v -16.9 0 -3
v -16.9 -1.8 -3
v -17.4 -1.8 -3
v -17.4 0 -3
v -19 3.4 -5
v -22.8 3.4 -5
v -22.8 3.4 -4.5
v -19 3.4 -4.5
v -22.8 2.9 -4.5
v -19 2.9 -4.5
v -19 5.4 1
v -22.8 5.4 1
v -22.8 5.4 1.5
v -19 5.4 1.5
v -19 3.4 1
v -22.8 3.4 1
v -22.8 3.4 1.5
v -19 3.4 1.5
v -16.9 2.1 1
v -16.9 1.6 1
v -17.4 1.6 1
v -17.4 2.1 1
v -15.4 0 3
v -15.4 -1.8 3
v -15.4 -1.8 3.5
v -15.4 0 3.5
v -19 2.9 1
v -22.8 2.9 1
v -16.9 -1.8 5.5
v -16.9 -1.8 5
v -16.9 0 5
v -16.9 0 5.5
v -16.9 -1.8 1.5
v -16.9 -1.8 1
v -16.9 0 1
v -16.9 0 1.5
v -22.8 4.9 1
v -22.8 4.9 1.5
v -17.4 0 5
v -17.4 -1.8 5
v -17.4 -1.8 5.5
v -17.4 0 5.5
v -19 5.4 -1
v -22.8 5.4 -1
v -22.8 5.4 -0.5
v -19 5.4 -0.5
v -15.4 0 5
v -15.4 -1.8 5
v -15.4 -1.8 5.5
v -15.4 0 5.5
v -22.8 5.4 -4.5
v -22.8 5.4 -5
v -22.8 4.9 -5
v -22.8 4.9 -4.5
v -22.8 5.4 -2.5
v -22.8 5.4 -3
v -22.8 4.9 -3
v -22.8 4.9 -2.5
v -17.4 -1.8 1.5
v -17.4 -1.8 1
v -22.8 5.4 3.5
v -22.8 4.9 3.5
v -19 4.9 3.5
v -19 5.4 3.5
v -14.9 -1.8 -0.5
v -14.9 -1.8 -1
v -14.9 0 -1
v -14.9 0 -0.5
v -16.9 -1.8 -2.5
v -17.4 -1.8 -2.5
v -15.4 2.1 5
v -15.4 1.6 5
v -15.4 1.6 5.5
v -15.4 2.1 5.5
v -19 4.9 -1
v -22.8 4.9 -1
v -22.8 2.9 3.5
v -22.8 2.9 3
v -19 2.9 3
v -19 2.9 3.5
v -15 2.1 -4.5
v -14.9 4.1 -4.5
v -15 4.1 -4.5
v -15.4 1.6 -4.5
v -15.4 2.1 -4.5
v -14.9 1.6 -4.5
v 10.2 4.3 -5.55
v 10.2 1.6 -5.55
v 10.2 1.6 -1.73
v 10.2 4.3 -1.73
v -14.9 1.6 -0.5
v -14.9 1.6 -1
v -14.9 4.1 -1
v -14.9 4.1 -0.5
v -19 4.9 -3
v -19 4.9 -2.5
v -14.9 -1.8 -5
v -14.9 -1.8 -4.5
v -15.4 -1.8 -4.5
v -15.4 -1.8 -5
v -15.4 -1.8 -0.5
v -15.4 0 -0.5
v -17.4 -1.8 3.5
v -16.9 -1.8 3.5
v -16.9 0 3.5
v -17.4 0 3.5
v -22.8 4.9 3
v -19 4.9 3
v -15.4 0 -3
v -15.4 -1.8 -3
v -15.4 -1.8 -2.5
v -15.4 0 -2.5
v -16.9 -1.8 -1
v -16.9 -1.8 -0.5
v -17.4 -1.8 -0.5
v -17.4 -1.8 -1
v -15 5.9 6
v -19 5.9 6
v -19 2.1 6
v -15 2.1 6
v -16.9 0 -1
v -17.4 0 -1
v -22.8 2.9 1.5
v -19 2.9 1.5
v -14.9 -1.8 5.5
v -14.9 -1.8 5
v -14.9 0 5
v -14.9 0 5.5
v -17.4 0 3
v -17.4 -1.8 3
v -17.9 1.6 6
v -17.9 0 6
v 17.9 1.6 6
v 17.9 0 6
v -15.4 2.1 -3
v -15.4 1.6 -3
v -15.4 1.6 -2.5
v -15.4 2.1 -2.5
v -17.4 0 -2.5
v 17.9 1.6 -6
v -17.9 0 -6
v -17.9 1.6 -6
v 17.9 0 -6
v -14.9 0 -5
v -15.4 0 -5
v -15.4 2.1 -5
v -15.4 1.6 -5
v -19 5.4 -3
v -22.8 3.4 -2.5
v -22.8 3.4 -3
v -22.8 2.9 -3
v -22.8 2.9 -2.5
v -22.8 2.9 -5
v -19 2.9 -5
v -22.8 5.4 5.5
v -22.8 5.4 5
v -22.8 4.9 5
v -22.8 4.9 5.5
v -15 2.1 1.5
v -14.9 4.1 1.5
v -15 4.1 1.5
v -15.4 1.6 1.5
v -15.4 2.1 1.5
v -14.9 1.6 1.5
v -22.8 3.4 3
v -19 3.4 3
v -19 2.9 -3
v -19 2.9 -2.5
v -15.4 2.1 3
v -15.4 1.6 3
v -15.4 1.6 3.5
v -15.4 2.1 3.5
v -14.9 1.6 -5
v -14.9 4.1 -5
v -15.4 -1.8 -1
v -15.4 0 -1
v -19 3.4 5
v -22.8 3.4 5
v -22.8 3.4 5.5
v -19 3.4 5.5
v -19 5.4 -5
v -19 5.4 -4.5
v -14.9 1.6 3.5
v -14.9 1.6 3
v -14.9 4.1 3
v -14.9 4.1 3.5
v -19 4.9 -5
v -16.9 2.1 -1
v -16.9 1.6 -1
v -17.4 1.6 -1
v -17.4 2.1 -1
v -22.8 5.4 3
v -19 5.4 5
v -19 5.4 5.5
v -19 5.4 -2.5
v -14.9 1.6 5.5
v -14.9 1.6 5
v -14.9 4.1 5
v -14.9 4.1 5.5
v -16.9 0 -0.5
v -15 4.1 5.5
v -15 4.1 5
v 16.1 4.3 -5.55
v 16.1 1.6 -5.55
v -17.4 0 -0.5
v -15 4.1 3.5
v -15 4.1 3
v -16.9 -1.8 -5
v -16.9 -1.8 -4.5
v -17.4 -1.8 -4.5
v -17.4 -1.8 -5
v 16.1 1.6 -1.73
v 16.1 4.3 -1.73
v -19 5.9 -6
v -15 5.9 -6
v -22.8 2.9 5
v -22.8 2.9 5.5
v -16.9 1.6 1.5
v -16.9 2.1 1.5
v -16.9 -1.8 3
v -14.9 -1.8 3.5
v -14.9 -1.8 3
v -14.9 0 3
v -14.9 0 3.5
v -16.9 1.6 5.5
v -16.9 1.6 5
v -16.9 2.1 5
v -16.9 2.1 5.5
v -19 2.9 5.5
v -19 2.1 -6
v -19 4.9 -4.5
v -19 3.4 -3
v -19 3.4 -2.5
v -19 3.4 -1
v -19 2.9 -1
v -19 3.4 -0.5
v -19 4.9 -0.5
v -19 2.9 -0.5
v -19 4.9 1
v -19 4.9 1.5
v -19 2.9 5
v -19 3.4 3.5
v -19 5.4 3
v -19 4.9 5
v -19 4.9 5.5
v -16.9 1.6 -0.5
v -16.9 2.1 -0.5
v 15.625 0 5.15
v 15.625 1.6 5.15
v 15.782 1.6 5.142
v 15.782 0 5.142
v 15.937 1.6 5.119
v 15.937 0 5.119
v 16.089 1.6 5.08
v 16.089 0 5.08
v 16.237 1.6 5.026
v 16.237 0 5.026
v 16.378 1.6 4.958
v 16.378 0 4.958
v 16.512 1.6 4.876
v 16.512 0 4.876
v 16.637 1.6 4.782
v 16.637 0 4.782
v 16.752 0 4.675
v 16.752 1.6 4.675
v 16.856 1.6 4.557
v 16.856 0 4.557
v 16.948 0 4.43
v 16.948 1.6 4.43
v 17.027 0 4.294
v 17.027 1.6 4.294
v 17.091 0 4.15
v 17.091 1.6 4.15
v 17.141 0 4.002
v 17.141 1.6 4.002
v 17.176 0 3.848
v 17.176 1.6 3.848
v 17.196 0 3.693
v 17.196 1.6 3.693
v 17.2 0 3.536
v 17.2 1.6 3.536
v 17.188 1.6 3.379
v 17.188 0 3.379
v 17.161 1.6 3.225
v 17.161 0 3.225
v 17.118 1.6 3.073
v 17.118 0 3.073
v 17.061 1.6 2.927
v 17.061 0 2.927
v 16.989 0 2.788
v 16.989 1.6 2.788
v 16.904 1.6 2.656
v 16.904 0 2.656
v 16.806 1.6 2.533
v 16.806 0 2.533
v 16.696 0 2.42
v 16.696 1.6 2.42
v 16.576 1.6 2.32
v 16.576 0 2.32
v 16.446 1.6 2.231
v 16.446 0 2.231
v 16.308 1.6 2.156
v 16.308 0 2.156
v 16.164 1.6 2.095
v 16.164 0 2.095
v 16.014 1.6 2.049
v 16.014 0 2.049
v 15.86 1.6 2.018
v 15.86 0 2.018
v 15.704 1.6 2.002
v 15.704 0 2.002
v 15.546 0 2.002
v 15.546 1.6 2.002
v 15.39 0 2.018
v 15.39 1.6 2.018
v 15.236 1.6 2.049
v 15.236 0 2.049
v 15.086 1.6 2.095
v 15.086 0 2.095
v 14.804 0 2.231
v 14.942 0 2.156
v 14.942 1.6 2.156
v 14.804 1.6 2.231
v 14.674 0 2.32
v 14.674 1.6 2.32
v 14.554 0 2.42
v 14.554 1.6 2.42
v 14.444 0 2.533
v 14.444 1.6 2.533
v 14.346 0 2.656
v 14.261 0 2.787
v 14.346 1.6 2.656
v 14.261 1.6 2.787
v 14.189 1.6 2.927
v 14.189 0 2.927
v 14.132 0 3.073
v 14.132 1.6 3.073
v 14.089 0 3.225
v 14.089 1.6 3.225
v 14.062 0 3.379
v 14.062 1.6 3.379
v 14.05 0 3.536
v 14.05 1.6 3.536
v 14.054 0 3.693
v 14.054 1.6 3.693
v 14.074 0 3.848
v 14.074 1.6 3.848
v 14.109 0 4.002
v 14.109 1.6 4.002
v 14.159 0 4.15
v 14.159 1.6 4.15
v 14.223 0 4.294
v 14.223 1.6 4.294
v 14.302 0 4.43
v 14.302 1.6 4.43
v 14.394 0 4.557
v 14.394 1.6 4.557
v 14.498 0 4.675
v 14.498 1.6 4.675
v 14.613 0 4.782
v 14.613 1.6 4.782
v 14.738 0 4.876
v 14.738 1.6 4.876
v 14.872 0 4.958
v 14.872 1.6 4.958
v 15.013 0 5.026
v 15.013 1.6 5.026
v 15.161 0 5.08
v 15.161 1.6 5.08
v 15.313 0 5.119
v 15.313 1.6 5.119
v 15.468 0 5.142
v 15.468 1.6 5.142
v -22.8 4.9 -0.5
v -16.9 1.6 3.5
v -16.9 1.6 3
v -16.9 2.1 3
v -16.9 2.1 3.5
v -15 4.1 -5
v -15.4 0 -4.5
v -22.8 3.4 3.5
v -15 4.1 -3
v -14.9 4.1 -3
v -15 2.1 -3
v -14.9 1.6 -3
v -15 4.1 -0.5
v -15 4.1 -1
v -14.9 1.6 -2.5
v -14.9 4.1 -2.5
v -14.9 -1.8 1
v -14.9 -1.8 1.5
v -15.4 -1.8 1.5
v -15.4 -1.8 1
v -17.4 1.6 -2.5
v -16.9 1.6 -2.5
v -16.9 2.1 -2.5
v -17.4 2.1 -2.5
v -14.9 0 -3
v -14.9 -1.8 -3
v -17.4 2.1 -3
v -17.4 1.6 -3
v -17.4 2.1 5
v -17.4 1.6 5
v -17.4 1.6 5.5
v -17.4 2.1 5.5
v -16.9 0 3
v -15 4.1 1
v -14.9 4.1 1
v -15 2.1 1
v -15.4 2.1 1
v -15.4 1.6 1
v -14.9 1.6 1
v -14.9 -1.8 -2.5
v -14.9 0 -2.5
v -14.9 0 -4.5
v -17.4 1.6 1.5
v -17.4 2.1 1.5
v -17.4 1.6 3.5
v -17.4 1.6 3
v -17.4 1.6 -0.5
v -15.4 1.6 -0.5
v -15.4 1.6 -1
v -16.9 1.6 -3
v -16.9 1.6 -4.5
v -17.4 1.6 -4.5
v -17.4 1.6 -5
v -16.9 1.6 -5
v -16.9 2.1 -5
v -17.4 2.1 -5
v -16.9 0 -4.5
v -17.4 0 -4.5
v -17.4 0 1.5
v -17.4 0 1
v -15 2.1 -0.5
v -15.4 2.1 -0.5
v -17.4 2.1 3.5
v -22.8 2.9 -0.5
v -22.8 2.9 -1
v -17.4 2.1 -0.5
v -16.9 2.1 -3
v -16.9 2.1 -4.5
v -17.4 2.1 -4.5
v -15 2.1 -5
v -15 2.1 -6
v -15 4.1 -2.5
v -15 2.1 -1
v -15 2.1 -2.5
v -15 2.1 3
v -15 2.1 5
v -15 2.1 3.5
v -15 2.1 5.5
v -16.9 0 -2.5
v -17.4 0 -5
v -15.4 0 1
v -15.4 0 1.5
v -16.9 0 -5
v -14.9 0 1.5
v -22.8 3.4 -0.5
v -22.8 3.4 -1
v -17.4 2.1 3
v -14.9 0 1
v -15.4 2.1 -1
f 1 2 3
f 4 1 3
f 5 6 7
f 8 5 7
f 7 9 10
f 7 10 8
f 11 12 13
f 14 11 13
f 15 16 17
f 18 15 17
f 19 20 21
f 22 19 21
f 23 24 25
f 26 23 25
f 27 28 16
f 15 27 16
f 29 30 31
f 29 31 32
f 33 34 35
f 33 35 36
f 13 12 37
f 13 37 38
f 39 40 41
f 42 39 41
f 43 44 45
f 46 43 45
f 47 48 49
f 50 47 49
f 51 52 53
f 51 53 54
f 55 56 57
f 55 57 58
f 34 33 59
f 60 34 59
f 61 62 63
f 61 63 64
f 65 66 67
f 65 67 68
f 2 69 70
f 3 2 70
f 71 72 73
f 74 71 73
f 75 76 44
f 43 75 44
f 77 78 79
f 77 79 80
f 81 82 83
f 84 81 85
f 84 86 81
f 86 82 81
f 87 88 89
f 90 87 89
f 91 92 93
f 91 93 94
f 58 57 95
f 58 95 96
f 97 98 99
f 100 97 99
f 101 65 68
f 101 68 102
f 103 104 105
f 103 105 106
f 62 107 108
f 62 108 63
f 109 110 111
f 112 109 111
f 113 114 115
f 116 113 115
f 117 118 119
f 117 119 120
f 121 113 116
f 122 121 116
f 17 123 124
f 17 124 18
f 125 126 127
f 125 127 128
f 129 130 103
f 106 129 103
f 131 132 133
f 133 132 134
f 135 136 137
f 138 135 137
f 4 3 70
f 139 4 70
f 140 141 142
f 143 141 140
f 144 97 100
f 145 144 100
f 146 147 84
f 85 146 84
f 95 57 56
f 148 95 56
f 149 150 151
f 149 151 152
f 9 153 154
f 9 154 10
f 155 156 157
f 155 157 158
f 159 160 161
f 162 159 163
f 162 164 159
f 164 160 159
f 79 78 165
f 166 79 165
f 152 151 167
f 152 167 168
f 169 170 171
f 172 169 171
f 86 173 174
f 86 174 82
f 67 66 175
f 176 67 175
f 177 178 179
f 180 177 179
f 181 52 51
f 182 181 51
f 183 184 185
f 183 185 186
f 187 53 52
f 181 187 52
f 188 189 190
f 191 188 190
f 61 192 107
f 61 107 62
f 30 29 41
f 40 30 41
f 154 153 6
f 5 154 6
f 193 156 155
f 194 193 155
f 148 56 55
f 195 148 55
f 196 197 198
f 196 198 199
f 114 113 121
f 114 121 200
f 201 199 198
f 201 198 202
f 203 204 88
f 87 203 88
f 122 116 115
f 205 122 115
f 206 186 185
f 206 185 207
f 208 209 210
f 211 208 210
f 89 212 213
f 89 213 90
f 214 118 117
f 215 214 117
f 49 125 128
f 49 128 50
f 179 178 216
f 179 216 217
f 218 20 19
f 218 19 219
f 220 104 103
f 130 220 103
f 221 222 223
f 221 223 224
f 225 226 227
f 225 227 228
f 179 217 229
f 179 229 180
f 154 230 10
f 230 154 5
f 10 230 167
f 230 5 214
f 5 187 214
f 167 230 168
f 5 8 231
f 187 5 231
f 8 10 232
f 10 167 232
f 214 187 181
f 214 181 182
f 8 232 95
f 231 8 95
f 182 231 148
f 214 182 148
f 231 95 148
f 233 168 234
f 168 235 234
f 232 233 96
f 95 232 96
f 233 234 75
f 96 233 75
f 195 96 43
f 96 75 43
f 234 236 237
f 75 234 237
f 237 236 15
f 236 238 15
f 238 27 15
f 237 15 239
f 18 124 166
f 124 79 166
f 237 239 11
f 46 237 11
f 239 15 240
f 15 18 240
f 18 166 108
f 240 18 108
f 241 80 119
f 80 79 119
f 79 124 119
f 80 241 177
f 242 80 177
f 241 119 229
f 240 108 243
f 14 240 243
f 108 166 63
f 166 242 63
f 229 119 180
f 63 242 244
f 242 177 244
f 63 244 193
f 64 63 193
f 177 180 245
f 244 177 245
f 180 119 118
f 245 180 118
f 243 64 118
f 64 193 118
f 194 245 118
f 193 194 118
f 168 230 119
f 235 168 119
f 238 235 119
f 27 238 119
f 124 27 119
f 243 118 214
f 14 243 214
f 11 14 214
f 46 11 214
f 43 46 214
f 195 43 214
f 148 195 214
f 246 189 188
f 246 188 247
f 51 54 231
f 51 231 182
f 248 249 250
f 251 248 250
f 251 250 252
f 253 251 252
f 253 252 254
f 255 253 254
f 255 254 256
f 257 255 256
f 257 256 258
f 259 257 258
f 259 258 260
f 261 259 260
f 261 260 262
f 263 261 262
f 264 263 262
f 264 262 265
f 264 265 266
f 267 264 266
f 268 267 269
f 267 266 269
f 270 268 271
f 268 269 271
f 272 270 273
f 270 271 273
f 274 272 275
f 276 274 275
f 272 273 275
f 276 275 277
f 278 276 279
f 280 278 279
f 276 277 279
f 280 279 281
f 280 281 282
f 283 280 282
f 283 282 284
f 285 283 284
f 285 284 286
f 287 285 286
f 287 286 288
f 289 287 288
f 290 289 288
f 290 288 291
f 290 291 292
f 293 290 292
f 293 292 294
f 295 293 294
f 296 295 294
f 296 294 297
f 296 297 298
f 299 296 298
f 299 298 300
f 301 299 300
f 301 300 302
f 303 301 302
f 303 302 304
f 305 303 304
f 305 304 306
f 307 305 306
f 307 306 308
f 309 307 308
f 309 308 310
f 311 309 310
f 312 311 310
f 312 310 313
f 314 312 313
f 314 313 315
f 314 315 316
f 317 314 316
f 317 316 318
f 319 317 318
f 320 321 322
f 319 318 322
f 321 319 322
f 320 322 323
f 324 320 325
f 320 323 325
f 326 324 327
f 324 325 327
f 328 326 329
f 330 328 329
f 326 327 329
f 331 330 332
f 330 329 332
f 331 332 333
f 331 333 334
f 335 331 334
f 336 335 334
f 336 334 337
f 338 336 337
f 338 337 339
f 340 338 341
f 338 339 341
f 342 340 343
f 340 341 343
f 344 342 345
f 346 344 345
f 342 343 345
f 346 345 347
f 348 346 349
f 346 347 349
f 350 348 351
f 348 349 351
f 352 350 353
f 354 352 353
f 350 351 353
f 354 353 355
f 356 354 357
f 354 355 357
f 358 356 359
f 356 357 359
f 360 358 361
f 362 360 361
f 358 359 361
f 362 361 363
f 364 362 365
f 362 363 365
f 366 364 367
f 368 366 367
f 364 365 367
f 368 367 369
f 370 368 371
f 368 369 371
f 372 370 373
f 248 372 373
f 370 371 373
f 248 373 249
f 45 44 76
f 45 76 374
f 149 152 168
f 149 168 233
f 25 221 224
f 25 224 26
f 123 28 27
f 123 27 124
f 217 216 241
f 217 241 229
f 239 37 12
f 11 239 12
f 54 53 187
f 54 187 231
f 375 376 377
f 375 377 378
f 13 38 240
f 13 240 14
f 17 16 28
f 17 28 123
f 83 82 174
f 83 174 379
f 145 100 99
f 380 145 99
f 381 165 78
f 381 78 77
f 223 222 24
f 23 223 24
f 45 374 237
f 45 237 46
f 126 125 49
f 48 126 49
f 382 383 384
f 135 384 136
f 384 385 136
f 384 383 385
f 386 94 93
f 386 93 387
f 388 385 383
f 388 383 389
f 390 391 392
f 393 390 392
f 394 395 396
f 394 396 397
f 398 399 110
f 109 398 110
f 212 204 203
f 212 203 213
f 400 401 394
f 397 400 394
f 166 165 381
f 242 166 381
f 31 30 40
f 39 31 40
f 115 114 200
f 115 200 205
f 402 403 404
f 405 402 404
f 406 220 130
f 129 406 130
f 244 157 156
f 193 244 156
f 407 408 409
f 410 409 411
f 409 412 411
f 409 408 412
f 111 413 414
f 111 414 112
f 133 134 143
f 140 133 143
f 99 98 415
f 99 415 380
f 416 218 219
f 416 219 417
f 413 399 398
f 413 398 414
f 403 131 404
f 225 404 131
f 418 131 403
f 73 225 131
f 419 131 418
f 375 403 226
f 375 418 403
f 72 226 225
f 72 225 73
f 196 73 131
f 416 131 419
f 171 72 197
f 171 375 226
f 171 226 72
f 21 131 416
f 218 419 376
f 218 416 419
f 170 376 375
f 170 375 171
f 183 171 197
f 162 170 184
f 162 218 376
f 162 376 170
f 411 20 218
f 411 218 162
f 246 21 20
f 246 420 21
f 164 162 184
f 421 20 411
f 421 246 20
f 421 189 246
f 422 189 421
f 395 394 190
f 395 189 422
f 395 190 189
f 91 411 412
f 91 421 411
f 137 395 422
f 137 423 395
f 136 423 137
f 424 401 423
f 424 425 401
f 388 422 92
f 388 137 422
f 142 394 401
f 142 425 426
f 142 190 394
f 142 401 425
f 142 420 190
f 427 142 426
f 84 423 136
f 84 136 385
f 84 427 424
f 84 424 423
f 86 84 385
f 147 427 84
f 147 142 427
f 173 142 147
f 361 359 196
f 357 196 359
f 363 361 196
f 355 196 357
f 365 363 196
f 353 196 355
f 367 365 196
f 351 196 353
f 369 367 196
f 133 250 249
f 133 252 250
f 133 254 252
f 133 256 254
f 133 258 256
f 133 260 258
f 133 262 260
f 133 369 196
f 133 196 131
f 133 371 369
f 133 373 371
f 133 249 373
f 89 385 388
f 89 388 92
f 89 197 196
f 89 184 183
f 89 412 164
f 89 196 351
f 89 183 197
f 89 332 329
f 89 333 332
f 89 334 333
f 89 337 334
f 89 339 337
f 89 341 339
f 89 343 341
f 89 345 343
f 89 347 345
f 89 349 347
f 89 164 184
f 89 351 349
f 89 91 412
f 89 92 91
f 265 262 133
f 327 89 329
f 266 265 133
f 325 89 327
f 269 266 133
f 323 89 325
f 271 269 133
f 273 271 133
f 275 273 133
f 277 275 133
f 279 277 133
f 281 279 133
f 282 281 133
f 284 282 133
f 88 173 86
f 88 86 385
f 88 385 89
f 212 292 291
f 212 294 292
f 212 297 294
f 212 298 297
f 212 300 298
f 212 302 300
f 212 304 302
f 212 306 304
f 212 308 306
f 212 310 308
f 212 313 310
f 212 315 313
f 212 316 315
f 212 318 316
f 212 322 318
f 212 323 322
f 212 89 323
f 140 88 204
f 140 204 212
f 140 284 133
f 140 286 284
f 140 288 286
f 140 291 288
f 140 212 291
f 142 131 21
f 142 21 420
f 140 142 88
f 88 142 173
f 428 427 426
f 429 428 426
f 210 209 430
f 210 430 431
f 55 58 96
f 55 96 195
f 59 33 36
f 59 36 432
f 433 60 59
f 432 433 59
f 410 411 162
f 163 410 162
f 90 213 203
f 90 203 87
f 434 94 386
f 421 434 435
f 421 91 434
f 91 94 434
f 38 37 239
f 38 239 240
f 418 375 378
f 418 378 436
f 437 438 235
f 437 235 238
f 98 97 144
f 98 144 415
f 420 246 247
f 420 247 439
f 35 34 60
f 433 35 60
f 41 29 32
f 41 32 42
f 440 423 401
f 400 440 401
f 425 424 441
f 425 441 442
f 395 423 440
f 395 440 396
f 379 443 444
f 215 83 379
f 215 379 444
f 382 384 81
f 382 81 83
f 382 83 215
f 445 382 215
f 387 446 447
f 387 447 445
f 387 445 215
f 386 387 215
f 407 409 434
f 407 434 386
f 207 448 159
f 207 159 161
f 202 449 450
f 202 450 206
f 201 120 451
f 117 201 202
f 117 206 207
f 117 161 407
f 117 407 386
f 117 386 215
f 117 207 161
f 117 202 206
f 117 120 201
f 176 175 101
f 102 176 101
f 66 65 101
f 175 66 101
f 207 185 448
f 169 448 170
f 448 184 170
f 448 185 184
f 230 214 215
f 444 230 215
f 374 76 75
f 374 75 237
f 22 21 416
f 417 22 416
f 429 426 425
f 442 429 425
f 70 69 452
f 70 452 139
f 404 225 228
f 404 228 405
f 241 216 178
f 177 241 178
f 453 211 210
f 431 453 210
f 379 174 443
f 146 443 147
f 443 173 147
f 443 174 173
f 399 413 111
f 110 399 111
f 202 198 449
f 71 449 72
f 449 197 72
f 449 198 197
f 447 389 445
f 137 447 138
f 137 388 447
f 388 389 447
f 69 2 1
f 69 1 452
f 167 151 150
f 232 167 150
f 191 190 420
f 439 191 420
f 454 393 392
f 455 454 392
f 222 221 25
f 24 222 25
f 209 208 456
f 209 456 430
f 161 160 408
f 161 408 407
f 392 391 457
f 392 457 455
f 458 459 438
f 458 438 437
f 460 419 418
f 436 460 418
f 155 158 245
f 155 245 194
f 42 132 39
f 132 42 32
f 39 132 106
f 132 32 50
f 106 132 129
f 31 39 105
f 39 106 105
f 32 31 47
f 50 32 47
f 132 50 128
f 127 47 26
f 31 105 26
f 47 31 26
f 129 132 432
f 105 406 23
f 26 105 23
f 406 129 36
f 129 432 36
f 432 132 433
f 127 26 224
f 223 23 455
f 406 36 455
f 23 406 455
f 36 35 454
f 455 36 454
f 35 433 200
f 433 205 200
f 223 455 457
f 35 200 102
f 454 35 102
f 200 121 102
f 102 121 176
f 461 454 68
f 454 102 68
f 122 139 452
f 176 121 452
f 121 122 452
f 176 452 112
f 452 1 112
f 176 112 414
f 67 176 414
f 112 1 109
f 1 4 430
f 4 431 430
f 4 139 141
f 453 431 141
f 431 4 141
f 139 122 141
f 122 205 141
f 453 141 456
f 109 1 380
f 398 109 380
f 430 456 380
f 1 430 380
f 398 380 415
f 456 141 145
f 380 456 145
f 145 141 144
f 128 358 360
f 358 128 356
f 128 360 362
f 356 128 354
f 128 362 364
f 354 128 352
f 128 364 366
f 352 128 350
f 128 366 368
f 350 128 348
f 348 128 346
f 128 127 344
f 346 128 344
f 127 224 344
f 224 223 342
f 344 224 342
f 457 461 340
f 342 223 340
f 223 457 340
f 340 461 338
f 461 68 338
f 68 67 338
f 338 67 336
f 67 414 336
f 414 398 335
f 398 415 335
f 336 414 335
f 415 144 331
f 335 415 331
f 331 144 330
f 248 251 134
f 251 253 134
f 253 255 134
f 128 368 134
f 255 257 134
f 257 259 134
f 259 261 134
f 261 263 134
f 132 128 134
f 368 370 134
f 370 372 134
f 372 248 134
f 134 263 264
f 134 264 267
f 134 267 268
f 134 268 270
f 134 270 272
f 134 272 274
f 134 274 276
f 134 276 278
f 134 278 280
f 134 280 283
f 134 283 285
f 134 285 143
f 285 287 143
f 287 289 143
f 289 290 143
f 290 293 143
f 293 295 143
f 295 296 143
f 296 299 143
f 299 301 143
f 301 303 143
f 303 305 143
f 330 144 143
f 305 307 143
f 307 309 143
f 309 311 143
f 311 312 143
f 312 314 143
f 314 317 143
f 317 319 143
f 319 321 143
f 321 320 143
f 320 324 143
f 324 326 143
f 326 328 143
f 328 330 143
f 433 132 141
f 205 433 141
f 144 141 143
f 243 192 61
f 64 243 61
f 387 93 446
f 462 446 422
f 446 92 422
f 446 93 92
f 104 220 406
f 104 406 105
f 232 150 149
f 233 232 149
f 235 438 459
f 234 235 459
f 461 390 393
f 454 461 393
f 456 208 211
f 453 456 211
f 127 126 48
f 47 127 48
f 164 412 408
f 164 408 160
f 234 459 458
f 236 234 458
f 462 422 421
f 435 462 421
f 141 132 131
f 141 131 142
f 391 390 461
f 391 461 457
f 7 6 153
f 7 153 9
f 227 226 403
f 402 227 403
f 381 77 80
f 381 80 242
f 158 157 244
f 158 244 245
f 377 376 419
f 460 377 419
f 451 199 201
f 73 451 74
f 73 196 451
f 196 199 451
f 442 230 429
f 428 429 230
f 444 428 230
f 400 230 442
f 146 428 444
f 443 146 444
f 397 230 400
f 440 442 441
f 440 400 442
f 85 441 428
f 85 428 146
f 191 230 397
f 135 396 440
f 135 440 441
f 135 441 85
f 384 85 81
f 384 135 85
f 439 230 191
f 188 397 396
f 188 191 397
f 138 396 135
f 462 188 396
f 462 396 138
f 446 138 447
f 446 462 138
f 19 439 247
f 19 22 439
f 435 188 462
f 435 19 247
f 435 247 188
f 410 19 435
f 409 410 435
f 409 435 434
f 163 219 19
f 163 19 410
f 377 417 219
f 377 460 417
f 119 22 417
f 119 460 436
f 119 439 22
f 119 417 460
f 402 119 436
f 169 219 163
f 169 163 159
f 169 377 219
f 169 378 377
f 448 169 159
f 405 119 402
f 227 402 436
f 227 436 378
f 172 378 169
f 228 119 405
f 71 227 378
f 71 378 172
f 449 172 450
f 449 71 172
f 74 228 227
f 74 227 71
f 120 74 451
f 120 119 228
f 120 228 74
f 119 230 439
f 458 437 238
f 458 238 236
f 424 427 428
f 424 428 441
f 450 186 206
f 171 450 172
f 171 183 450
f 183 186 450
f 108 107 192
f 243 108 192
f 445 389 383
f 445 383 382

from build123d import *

# Parameters (mm, degrees)
SKETCH1_W                = 35.8
SKETCH1_H                = 12
BOARD_DEPTH              = 1.6
SKETCH2_R                = 1.575
HOLE_DEPTH               = 2.6
SKETCH3_W                = 5.9
SKETCH3_H                = 3.82
SETUP_SWITCH_DEPTH       = 2.7
SURFACE_START            = -3.4
SKETCH4_W                = 0.5
SKETCH4_H                = 0.5
SURFACE_CONNECTORS_DEPTH = 5.9
LPATTERN1_COUNT          = 6
LPATTERN1_PITCH          = 2
LPATTERN1_COUNT_DIR2     = 2
LPATTERN1_PITCH_DIR2     = 2
SKETCH5_W                = 4
SKETCH5_H                = 3.8
CONNECTOR_BODY_DEPTH     = 12
SKETCH6_W                = 0.5
SKETCH6_H                = 0.5
CONNECTOR_PIN_DEPTH      = 3.8
LPATTERN2_COUNT          = 6
LPATTERN2_PITCH          = 2
LPATTERN2_COUNT_DIR2     = 2
LPATTERN2_PITCH_DIR2     = 2


with BuildPart() as part:
    # Sketch1 → Board (new body)
    with BuildSketch(Plane(origin=(0, 0, 0), x_dir=(1, 0, 0), z_dir=(0, 1, 0))):
        Rectangle(SKETCH1_W, SKETCH1_H)
    extrude(amount=BOARD_DEPTH)

    # Sketch2 → Hole (cut, through all)
    with BuildSketch(Plane(origin=(0, 1.6, 0), x_dir=(-1, 0, 0), z_dir=(0, 1, 0))):
        with Locations(Location((-15.625, 3.575, 0), (0, 0, 90))):  # turned: the seam where the file's is
            Circle(SKETCH2_R)
    extrude(amount=-HOLE_DEPTH, mode=Mode.SUBTRACT)

    # Sketch3 → Setup Switch (add)
    with BuildSketch(Plane(origin=(0, 1.6, 0), x_dir=(-1, 0, 0), z_dir=(0, 1, 0))):
        with Locations((-13.15, -3.64)):
            Rectangle(SKETCH3_W, SKETCH3_H)
    extrude(amount=SETUP_SWITCH_DEPTH)

    # Sketch4 → Surface Connectors (add)
    with BuildSketch(Plane(origin=(0, 1.6, 0), x_dir=(-1, 0, 0), z_dir=(0, 1, 0)).offset(SURFACE_START)):
        with Locations((17.15, 5.25)):
            Rectangle(SKETCH4_W, SKETCH4_H)
    surface_connectors = extrude(amount=SURFACE_CONNECTORS_DEPTH)

    # LPattern1: Surface Connectors 6 × 2
    with Locations(*[(j * LPATTERN1_PITCH_DIR2, 0, -i * LPATTERN1_PITCH) for i in range(LPATTERN1_COUNT) for j in range(LPATTERN1_COUNT_DIR2) if (i, j) != (0, 0)]):
        add(surface_connectors)

    # Sketch5 → Connector Body (add)
    with BuildSketch(Plane.XY.offset(6)):
        with Locations((-17, 4)):
            Rectangle(SKETCH5_W, SKETCH5_H)
    extrude(amount=-CONNECTOR_BODY_DEPTH)

    # Sketch6 → Connector Pin (add)
    with BuildSketch(Plane.ZY.offset(19)):
        with Locations((5.25, 5.15)):
            Rectangle(SKETCH6_W, SKETCH6_H)
    connector_pin = extrude(amount=CONNECTOR_PIN_DEPTH)

    # LPattern2: Connector Pin 6 × 2
    with Locations(*[(0, -j * LPATTERN2_PITCH_DIR2, -i * LPATTERN2_PITCH) for i in range(LPATTERN2_COUNT) for j in range(LPATTERN2_COUNT_DIR2) if (i, j) != (0, 0)]):
        add(connector_pin)


solid = part.part
